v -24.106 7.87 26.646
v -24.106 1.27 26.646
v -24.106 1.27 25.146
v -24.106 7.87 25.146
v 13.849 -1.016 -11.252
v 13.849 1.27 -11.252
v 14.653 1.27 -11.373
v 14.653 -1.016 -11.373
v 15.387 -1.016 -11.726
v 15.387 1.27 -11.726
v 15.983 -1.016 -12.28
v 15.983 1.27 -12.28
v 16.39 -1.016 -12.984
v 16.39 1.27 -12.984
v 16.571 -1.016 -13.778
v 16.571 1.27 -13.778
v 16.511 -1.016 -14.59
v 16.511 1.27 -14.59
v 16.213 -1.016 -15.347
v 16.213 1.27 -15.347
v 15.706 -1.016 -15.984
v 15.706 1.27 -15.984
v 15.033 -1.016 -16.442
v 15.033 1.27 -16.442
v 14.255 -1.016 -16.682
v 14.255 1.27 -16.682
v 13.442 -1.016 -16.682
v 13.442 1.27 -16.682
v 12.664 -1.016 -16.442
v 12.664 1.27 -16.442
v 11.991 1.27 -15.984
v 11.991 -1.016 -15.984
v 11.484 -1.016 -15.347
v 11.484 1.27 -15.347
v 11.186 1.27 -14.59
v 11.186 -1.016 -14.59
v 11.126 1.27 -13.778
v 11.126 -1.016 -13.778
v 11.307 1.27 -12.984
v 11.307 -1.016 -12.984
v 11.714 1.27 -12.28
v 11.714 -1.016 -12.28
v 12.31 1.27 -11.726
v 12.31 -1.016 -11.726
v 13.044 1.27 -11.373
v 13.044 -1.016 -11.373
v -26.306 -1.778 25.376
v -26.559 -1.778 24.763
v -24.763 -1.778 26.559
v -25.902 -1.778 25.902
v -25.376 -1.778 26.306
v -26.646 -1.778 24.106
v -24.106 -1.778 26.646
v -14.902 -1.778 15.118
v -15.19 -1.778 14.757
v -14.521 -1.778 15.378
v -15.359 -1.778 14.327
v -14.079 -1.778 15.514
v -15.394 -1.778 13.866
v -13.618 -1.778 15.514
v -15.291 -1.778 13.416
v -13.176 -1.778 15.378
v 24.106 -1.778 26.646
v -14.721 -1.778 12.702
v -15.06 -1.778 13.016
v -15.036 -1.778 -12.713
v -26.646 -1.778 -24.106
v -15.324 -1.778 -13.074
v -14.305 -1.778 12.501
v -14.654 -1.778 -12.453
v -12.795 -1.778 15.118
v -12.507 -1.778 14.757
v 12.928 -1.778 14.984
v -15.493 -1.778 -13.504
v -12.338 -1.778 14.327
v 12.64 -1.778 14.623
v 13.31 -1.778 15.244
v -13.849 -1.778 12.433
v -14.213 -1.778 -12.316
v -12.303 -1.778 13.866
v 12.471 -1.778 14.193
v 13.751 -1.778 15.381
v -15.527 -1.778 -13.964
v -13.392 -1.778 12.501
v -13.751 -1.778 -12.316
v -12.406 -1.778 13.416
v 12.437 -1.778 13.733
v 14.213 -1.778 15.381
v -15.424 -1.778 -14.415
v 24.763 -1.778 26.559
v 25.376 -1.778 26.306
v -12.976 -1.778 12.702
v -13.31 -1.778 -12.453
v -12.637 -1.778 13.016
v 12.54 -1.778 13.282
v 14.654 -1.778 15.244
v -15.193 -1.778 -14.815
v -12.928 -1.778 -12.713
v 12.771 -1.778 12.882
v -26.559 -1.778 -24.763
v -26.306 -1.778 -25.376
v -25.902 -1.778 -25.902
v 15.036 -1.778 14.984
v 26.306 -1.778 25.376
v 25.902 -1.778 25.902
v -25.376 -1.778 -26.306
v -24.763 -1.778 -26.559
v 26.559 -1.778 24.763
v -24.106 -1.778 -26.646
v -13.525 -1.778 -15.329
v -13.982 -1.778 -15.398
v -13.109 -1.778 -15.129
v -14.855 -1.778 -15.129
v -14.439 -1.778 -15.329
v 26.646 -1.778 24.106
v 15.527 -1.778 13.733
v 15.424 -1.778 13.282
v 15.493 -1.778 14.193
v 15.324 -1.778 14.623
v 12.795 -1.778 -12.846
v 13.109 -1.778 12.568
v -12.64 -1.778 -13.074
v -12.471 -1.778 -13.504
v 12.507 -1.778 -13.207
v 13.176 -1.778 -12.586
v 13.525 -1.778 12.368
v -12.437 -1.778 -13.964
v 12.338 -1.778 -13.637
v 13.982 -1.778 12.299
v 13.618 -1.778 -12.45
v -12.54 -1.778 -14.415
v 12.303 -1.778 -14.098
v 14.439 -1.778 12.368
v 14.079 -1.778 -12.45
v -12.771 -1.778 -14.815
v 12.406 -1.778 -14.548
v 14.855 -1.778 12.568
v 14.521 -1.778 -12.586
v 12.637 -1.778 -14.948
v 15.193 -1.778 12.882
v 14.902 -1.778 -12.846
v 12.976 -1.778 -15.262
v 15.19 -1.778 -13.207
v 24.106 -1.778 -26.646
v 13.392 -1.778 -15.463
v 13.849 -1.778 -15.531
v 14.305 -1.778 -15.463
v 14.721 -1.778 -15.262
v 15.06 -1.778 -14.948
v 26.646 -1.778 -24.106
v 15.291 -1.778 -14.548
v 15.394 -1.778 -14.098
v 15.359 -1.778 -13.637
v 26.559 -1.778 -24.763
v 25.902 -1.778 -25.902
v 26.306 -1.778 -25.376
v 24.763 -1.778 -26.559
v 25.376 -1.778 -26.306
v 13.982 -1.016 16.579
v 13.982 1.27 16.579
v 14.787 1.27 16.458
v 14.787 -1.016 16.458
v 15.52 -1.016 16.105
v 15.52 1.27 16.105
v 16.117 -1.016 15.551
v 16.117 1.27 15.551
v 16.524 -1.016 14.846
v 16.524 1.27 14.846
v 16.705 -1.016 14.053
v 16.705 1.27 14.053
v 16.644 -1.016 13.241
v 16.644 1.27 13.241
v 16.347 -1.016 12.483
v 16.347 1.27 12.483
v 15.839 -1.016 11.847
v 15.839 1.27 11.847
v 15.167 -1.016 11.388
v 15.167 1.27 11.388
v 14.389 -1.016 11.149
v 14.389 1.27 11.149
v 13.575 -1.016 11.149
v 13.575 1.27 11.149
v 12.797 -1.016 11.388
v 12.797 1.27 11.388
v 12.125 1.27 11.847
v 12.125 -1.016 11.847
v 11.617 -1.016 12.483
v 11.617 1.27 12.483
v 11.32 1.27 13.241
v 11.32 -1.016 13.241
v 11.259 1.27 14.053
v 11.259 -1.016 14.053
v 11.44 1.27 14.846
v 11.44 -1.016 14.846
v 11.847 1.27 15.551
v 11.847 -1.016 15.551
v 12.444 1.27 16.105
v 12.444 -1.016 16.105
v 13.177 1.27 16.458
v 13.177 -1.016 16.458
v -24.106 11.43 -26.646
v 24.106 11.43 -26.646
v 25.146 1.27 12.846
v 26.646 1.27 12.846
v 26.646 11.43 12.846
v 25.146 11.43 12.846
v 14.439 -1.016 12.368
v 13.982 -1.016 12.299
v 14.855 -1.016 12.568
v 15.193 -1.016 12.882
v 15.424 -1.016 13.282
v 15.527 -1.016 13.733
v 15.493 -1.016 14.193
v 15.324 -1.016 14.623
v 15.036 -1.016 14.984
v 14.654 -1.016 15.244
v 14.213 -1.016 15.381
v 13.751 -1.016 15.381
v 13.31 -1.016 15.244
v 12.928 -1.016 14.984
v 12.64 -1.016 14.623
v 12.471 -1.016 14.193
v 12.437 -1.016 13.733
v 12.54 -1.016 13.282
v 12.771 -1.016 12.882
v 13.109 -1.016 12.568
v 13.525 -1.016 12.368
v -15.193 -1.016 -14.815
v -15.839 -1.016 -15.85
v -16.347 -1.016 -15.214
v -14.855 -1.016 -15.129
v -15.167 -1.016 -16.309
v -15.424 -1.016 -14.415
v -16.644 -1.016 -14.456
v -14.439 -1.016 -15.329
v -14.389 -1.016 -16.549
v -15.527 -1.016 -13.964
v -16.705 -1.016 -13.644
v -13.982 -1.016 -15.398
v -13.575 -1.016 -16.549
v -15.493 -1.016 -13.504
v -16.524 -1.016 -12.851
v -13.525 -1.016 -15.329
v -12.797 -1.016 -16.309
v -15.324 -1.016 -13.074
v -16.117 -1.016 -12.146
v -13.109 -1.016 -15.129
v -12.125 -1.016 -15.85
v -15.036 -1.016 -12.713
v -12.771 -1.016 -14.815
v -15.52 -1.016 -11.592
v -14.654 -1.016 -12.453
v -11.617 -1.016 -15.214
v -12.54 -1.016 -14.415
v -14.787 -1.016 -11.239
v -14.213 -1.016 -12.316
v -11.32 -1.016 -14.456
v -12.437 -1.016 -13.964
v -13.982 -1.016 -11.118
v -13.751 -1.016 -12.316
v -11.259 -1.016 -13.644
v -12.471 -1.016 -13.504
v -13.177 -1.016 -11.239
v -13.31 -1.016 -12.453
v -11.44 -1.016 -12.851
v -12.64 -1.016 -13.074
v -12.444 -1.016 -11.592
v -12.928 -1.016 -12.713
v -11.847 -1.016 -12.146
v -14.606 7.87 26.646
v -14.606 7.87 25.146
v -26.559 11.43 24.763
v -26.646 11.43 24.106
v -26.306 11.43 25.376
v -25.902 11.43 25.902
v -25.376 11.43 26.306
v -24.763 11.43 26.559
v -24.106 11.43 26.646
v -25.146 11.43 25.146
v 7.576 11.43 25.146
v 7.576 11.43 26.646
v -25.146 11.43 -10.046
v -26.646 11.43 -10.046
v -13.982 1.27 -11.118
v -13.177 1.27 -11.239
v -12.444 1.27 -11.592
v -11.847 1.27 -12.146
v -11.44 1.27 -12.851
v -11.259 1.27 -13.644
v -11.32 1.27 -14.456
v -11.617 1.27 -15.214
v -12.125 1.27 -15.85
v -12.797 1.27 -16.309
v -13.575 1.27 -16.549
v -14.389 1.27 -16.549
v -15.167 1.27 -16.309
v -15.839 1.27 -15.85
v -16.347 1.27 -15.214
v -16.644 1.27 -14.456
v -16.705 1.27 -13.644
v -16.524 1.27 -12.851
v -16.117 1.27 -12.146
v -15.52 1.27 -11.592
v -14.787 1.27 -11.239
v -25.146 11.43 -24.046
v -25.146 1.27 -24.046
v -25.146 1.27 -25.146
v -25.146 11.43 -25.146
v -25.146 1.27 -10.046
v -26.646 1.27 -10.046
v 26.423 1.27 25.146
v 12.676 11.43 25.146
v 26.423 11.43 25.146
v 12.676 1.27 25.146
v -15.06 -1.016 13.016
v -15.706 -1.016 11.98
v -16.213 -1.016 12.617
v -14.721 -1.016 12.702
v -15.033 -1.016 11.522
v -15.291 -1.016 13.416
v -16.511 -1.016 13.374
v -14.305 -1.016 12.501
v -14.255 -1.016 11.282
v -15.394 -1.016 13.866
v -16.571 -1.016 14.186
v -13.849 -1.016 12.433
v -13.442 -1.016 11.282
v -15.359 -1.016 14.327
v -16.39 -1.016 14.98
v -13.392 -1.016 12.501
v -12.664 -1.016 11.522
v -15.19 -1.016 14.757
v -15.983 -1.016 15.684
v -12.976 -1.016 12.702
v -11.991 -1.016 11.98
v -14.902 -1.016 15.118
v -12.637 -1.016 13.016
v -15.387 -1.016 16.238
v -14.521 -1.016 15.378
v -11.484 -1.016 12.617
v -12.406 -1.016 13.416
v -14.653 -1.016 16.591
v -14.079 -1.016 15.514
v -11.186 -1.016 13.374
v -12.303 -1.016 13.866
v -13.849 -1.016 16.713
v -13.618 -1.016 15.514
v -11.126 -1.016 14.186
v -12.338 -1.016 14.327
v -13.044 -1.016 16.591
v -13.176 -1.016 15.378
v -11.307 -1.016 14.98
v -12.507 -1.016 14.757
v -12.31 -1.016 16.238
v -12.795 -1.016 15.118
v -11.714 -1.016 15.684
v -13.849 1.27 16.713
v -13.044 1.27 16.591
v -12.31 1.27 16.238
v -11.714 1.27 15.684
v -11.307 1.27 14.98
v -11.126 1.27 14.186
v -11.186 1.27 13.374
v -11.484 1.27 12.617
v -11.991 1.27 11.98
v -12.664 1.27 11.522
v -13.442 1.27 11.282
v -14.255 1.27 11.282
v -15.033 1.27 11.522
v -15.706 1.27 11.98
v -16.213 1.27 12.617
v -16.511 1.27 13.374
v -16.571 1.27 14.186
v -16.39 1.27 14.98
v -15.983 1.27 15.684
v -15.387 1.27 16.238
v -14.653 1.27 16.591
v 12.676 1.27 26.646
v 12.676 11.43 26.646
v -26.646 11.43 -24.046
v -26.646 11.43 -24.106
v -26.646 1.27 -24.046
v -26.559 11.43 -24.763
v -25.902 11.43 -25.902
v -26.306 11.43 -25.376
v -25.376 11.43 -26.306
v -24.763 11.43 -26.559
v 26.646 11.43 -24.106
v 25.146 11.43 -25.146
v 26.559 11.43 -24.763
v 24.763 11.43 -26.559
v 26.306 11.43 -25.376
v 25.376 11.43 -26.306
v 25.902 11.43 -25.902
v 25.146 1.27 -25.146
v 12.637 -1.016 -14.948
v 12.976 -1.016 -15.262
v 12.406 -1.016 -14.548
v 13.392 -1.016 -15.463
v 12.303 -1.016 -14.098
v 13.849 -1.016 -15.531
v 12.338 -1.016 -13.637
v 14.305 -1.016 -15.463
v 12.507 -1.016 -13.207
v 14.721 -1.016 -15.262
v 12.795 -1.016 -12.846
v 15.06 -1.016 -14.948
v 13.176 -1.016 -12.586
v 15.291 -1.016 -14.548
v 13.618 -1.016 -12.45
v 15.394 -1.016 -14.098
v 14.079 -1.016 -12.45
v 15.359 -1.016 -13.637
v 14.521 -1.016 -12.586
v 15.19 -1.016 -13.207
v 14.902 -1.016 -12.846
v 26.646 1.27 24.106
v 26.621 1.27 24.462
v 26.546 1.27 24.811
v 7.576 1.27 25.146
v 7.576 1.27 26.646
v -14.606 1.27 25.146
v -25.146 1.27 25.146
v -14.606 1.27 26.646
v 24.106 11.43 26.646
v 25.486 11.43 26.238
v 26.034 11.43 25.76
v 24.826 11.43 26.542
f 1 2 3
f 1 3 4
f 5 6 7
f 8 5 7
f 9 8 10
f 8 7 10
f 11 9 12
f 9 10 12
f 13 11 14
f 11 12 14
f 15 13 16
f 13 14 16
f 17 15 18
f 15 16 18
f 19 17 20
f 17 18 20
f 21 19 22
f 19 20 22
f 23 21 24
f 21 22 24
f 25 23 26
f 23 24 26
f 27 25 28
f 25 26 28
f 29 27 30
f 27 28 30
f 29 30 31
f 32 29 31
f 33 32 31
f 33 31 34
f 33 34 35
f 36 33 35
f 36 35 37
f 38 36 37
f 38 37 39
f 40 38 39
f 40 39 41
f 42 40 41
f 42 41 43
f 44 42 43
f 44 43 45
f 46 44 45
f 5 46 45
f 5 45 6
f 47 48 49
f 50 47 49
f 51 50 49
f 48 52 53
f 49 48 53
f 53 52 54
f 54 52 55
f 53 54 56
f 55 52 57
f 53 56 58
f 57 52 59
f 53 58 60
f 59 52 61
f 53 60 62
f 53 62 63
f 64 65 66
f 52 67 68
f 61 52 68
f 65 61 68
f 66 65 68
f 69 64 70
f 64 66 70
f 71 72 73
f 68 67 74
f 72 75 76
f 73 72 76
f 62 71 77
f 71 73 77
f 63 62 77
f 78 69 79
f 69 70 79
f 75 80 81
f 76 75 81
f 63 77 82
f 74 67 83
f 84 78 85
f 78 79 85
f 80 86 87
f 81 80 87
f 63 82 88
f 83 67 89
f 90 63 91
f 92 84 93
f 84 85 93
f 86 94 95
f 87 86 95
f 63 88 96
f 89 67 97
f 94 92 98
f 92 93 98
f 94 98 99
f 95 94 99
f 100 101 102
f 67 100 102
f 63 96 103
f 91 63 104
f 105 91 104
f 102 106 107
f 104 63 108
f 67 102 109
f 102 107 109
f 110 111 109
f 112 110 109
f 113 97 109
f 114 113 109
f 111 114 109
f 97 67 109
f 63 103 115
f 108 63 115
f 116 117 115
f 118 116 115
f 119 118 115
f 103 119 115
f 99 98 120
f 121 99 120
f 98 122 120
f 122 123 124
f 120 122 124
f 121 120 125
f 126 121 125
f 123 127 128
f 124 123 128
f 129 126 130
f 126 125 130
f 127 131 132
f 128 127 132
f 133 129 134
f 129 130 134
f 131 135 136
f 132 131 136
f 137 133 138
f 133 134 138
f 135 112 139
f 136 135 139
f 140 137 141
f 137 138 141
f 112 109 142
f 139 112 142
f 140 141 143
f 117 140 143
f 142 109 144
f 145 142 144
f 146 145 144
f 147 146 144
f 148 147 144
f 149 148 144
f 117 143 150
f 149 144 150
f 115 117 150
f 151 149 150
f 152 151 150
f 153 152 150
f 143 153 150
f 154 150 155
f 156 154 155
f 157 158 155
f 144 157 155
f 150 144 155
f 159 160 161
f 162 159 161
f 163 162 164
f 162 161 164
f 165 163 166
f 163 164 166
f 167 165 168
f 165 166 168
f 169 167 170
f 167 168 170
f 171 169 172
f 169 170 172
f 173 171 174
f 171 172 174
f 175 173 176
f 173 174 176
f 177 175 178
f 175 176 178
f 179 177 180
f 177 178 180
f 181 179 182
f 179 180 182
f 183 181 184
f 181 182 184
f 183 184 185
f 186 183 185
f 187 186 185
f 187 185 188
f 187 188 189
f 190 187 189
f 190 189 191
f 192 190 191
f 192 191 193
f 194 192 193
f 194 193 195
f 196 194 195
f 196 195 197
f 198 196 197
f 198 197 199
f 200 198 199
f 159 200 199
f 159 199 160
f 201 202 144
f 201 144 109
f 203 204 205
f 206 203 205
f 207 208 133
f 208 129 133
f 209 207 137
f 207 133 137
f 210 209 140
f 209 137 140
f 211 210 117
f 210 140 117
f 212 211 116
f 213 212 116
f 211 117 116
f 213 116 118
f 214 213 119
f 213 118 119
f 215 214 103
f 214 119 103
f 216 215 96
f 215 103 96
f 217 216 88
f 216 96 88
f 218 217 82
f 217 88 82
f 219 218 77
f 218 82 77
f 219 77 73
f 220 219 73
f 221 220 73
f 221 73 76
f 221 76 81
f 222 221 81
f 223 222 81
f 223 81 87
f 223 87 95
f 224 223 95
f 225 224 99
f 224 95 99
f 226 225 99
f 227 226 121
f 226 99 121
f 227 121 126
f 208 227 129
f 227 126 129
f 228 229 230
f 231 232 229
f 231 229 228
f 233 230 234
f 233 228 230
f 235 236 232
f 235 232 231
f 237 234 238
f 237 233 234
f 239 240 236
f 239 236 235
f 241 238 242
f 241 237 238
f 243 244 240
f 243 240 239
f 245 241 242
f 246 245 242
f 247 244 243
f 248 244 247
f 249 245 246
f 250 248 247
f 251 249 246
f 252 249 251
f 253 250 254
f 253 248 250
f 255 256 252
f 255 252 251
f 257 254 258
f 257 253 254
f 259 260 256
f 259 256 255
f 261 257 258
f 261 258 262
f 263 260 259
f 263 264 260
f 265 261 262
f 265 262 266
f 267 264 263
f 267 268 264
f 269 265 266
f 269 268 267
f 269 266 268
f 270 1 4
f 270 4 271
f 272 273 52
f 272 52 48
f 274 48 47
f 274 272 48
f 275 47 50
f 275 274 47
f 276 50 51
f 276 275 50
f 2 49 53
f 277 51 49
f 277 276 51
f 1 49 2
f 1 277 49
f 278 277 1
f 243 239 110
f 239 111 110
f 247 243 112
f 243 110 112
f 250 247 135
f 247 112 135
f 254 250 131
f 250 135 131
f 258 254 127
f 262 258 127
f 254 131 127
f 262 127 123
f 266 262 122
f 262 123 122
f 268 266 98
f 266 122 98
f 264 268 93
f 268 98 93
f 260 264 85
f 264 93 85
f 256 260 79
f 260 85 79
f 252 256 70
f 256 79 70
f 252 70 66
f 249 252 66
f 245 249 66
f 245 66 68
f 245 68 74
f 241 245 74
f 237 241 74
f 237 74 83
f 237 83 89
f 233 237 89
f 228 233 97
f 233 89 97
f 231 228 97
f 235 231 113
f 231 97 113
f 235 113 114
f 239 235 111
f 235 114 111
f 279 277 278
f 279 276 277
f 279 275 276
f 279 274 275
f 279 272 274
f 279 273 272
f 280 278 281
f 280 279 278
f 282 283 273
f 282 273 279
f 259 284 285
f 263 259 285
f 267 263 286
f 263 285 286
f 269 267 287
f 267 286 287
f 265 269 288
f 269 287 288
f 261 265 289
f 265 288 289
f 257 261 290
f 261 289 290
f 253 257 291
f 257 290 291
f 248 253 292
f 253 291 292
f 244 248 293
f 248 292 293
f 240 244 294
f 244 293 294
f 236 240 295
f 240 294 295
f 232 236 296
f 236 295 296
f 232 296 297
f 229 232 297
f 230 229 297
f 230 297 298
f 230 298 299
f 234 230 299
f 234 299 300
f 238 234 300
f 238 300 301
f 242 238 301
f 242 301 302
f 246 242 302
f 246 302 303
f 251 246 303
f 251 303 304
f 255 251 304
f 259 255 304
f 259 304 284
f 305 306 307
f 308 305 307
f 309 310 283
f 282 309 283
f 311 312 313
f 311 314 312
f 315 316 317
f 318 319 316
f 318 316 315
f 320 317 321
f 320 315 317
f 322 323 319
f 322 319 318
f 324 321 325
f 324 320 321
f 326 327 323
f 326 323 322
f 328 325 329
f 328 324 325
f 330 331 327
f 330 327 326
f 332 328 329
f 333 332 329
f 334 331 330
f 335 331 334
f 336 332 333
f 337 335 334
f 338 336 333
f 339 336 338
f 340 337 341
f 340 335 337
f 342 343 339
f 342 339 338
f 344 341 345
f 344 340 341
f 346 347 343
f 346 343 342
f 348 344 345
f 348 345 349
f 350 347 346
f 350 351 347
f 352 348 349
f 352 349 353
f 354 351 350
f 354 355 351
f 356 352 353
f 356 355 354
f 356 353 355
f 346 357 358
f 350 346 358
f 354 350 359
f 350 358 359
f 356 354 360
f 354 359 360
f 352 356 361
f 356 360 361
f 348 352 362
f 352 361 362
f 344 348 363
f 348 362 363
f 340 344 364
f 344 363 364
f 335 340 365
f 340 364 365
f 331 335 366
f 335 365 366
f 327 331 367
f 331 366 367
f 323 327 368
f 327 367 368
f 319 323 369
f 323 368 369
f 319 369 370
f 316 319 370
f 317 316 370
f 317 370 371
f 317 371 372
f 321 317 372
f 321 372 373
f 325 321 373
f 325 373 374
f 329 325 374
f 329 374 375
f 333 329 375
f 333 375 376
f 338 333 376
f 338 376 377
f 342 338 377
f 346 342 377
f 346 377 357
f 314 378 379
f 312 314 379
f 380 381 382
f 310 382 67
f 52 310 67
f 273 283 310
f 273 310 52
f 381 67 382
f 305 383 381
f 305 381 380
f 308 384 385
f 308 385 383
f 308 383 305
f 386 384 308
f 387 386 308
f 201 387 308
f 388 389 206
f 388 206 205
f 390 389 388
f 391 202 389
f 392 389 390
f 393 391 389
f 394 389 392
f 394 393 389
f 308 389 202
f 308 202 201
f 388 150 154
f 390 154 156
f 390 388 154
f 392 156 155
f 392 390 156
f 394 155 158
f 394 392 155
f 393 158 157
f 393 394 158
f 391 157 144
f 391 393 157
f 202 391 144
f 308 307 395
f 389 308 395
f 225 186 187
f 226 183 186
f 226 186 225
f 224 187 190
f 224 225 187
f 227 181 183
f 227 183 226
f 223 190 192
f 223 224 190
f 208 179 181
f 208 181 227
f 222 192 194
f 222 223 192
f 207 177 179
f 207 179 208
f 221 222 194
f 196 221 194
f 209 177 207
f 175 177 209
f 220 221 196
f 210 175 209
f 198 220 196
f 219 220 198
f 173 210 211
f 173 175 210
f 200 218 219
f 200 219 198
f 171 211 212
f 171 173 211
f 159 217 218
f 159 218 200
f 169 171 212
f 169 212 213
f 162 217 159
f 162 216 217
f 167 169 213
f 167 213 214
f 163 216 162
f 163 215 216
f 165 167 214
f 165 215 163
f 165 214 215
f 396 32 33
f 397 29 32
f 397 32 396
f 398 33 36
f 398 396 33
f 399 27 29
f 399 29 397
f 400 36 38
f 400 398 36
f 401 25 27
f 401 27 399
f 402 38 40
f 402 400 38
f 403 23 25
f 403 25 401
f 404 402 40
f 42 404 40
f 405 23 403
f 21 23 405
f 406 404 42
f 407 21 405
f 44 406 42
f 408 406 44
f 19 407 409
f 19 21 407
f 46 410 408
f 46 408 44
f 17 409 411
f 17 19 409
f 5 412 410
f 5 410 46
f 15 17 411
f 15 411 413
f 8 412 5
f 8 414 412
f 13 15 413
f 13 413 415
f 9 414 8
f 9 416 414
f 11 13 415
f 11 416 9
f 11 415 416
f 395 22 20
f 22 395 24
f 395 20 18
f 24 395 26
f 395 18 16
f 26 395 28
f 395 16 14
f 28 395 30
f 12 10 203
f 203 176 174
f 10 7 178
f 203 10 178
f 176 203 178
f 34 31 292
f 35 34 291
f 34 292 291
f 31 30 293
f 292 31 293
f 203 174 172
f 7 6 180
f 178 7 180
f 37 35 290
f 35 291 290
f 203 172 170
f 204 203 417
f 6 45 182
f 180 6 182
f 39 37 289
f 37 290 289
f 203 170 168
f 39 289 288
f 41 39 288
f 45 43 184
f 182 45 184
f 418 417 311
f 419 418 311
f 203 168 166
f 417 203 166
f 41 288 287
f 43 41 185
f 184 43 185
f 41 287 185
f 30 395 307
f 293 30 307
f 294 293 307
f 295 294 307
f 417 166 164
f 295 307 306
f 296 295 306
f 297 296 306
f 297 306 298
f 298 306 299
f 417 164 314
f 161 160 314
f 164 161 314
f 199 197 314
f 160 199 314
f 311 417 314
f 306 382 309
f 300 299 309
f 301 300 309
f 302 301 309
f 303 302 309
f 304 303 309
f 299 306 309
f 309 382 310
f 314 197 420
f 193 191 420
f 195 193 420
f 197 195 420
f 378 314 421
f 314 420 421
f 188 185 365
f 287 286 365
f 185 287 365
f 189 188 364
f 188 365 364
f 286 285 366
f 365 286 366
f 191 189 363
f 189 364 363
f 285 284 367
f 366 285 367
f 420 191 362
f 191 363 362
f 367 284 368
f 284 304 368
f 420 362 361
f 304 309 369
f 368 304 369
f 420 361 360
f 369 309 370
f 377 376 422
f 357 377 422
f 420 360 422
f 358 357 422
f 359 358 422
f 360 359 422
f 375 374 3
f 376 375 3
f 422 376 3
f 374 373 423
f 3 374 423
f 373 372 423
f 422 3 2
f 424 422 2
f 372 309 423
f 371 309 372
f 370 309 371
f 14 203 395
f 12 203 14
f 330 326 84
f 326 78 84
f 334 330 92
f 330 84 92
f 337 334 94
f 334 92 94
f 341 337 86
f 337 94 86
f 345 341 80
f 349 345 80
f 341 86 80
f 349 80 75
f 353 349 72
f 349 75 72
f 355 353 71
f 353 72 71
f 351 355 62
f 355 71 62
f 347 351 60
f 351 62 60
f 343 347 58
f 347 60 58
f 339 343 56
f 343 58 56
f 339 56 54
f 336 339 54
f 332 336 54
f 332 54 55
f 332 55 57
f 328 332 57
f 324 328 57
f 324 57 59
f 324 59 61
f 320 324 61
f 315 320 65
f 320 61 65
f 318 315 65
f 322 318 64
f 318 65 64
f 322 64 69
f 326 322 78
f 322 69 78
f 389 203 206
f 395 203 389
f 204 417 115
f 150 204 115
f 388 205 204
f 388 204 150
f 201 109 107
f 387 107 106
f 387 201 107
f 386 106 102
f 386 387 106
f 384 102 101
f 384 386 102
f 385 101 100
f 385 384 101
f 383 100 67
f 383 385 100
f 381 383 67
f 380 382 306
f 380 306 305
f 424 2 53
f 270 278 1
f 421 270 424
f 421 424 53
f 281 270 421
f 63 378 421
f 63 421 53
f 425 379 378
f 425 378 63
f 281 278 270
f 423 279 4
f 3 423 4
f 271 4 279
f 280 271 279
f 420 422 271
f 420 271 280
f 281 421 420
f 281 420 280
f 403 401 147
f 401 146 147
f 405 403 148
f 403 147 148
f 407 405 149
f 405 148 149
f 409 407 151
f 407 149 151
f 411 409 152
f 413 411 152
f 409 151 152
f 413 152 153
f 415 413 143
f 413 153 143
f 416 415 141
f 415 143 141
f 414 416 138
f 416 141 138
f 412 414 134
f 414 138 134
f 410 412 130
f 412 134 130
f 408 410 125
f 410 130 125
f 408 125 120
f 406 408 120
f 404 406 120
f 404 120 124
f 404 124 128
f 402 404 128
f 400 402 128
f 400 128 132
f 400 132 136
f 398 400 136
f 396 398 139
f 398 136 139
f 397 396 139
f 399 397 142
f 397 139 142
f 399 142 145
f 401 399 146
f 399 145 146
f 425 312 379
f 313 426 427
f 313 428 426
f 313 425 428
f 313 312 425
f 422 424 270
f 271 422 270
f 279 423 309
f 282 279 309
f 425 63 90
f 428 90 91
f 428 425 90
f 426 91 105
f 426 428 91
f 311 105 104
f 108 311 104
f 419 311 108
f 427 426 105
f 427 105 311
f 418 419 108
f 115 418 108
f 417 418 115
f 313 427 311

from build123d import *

# Parameters (mm, degrees)
SKETCH1_W           = 50.292
SKETCH1_H           = 50.292
BOSS_EXTRUDE1_DEPTH = 1.27
SKETCH1_3_W         = 53.292
SKETCH1_3_H         = 53.292
SKETCH1_3_W_2       = 50.292
SKETCH1_3_H_2       = 50.292
BOSS_EXTRUDE2_DEPTH = 11.43
SKETCH2_W           = 13.99999994
SKETCH2_H           = 10.16
CUT_EXTRUDE3_DEPTH  = 10
SKETCH3_W           = 9.5
SKETCH3_H           = 6.6
SKETCH3_W_2         = 5.1
SKETCH3_H_2         = 10.16
CUT_EXTRUDE4_DEPTH  = 10
SKETCH4_W           = 12.3
SKETCH4_H           = 10.16
CUT_EXTRUDE5_DEPTH  = 10
FILLET1_R           = 2.54
FILLET2_R           = 2.54
FILLET3_START       = -1
FILLET3_DEPTH       = 13
FILLET4_R           = 2.54
BOSS_EXTRUDE4_DEPTH = 3.048
HOLE1_D             = 3.0988
HOLE1_CBORE_D       = 5.461
HOLE1_CBORE_DEPTH   = 2.286


with BuildPart() as part:
    # Sketch1 → Boss-Extrude1 (new body)
    with BuildSketch(Plane(origin=(0, 0, 0), x_dir=(1, 0, 0), z_dir=(0, 1, 0))):
        Rectangle(SKETCH1_W, SKETCH1_H)
    extrude(amount=BOSS_EXTRUDE1_DEPTH)

    # Sketch1<3> → Boss-Extrude2 (add)
    with BuildSketch(Plane(origin=(0, 0, 0), x_dir=(1, 0, 0), z_dir=(0, 1, 0))):
        Rectangle(SKETCH1_3_W, SKETCH1_3_H)
        Rectangle(SKETCH1_3_W_2, SKETCH1_3_H_2, mode=Mode.SUBTRACT)
    extrude(amount=BOSS_EXTRUDE2_DEPTH)

    # Sketch2 → Cut-Extrude3 (cut)
    with BuildSketch(Plane.ZY.offset(26.646)):
        with Locations((-17.04600003, 6.35)):
            Rectangle(SKETCH2_W, SKETCH2_H)
    extrude(amount=-CUT_EXTRUDE3_DEPTH, mode=Mode.SUBTRACT)

    # Sketch3 → Cut-Extrude4 (cut)
    with BuildSketch(Plane.XY.offset(26.646)):
        with Locations((-19.356, 4.57)):
            Rectangle(SKETCH3_W, SKETCH3_H)
        with Locations((10.126, 6.35)):
            Rectangle(SKETCH3_W_2, SKETCH3_H_2)
    extrude(amount=-CUT_EXTRUDE4_DEPTH, mode=Mode.SUBTRACT)

    # Sketch4 → Cut-Extrude5 (cut)
    with BuildSketch(Plane(origin=(26.646, 0, 0), x_dir=(0, 0, -1), z_dir=(1, 0, 0))):
        with Locations((-18.996, 6.35)):
            Rectangle(SKETCH4_W, SKETCH4_H)
    extrude(amount=-CUT_EXTRUDE5_DEPTH, mode=Mode.SUBTRACT)

    # Fillet1
    fillet1_edges = [part.edges().sort_by_distance(p)[0] for p in [
        (26.646, 5.715, -26.646),
    ]]
    fillet(fillet1_edges, radius=FILLET1_R)

    # Fillet2
    fillet2_edges = [part.edges().sort_by_distance(p)[0] for p in [
        (-26.646, 5.715, -26.646),
    ]]
    fillet(fillet2_edges, radius=FILLET2_R)

    # Fillet3: read off the stored shape, not the designer's step
    # Fillet3 outline → Fillet3 (cut)
    with BuildSketch(Plane(origin=(0, 0, 0), x_dir=(1, 0, 0), z_dir=(0, 1, 0)).offset(FILLET3_START)):
        with BuildLine():
            Line((-26.646, -26.646), (-24.106, -26.646))
            ThreePointArc((-24.106, -26.646), (-25.902051224, -25.902051224), (-26.646, -24.106))
            Line((-26.646, -24.106), (-26.646, -26.646))
        make_face()
    extrude(amount=FILLET3_DEPTH, mode=Mode.SUBTRACT)

    # Fillet4
    fillet4_edges = [part.edges().sort_by_distance(p)[0] for p in [
        (26.646, 5.715, 26.646),
    ]]
    fillet(fillet4_edges, radius=FILLET4_R)

    # Sketch6 → Boss-Extrude4 (add)
    with BuildSketch(Plane(origin=(0, 1.27, 0), x_dir=(1, 0, 0), z_dir=(0, 1, 0))):
        with BuildLine():
            Line((26.646, -24.106), (26.646, 24.106))
            ThreePointArc((26.646, 24.106), (25.902051224, 25.902051224), (24.106, 26.646))
            Line((24.106, 26.646), (-24.106, 26.646))
            ThreePointArc((-24.106, 26.646), (-25.902051224, 25.902051224), (-26.646, 24.106))
            Line((-26.646, 24.106), (-26.646, -24.106))
            ThreePointArc((-26.646, -24.106), (-25.902051224, -25.902051224), (-24.106, -26.646))
            Line((-24.106, -26.646), (24.106, -26.646))
            ThreePointArc((24.106, -26.646), (25.902051224, -25.902051224), (26.646, -24.106))
        make_face()
    extrude(amount=-BOSS_EXTRUDE4_DEPTH)

    # Hole1 (through all)
    with Locations(Plane(origin=(-13.848520203, 1.27, 13.982017818), x_dir=(0, 0, 1), z_dir=(0, 1, 0))):
        with Locations((0, 0), (-27.830538021, -0.133497615), (-27.964035636, 27.697040406), (-0.133497615, 27.830538021)):
            CounterBoreHole(HOLE1_D / 2, HOLE1_CBORE_D / 2, HOLE1_CBORE_DEPTH)


solid = part.part
